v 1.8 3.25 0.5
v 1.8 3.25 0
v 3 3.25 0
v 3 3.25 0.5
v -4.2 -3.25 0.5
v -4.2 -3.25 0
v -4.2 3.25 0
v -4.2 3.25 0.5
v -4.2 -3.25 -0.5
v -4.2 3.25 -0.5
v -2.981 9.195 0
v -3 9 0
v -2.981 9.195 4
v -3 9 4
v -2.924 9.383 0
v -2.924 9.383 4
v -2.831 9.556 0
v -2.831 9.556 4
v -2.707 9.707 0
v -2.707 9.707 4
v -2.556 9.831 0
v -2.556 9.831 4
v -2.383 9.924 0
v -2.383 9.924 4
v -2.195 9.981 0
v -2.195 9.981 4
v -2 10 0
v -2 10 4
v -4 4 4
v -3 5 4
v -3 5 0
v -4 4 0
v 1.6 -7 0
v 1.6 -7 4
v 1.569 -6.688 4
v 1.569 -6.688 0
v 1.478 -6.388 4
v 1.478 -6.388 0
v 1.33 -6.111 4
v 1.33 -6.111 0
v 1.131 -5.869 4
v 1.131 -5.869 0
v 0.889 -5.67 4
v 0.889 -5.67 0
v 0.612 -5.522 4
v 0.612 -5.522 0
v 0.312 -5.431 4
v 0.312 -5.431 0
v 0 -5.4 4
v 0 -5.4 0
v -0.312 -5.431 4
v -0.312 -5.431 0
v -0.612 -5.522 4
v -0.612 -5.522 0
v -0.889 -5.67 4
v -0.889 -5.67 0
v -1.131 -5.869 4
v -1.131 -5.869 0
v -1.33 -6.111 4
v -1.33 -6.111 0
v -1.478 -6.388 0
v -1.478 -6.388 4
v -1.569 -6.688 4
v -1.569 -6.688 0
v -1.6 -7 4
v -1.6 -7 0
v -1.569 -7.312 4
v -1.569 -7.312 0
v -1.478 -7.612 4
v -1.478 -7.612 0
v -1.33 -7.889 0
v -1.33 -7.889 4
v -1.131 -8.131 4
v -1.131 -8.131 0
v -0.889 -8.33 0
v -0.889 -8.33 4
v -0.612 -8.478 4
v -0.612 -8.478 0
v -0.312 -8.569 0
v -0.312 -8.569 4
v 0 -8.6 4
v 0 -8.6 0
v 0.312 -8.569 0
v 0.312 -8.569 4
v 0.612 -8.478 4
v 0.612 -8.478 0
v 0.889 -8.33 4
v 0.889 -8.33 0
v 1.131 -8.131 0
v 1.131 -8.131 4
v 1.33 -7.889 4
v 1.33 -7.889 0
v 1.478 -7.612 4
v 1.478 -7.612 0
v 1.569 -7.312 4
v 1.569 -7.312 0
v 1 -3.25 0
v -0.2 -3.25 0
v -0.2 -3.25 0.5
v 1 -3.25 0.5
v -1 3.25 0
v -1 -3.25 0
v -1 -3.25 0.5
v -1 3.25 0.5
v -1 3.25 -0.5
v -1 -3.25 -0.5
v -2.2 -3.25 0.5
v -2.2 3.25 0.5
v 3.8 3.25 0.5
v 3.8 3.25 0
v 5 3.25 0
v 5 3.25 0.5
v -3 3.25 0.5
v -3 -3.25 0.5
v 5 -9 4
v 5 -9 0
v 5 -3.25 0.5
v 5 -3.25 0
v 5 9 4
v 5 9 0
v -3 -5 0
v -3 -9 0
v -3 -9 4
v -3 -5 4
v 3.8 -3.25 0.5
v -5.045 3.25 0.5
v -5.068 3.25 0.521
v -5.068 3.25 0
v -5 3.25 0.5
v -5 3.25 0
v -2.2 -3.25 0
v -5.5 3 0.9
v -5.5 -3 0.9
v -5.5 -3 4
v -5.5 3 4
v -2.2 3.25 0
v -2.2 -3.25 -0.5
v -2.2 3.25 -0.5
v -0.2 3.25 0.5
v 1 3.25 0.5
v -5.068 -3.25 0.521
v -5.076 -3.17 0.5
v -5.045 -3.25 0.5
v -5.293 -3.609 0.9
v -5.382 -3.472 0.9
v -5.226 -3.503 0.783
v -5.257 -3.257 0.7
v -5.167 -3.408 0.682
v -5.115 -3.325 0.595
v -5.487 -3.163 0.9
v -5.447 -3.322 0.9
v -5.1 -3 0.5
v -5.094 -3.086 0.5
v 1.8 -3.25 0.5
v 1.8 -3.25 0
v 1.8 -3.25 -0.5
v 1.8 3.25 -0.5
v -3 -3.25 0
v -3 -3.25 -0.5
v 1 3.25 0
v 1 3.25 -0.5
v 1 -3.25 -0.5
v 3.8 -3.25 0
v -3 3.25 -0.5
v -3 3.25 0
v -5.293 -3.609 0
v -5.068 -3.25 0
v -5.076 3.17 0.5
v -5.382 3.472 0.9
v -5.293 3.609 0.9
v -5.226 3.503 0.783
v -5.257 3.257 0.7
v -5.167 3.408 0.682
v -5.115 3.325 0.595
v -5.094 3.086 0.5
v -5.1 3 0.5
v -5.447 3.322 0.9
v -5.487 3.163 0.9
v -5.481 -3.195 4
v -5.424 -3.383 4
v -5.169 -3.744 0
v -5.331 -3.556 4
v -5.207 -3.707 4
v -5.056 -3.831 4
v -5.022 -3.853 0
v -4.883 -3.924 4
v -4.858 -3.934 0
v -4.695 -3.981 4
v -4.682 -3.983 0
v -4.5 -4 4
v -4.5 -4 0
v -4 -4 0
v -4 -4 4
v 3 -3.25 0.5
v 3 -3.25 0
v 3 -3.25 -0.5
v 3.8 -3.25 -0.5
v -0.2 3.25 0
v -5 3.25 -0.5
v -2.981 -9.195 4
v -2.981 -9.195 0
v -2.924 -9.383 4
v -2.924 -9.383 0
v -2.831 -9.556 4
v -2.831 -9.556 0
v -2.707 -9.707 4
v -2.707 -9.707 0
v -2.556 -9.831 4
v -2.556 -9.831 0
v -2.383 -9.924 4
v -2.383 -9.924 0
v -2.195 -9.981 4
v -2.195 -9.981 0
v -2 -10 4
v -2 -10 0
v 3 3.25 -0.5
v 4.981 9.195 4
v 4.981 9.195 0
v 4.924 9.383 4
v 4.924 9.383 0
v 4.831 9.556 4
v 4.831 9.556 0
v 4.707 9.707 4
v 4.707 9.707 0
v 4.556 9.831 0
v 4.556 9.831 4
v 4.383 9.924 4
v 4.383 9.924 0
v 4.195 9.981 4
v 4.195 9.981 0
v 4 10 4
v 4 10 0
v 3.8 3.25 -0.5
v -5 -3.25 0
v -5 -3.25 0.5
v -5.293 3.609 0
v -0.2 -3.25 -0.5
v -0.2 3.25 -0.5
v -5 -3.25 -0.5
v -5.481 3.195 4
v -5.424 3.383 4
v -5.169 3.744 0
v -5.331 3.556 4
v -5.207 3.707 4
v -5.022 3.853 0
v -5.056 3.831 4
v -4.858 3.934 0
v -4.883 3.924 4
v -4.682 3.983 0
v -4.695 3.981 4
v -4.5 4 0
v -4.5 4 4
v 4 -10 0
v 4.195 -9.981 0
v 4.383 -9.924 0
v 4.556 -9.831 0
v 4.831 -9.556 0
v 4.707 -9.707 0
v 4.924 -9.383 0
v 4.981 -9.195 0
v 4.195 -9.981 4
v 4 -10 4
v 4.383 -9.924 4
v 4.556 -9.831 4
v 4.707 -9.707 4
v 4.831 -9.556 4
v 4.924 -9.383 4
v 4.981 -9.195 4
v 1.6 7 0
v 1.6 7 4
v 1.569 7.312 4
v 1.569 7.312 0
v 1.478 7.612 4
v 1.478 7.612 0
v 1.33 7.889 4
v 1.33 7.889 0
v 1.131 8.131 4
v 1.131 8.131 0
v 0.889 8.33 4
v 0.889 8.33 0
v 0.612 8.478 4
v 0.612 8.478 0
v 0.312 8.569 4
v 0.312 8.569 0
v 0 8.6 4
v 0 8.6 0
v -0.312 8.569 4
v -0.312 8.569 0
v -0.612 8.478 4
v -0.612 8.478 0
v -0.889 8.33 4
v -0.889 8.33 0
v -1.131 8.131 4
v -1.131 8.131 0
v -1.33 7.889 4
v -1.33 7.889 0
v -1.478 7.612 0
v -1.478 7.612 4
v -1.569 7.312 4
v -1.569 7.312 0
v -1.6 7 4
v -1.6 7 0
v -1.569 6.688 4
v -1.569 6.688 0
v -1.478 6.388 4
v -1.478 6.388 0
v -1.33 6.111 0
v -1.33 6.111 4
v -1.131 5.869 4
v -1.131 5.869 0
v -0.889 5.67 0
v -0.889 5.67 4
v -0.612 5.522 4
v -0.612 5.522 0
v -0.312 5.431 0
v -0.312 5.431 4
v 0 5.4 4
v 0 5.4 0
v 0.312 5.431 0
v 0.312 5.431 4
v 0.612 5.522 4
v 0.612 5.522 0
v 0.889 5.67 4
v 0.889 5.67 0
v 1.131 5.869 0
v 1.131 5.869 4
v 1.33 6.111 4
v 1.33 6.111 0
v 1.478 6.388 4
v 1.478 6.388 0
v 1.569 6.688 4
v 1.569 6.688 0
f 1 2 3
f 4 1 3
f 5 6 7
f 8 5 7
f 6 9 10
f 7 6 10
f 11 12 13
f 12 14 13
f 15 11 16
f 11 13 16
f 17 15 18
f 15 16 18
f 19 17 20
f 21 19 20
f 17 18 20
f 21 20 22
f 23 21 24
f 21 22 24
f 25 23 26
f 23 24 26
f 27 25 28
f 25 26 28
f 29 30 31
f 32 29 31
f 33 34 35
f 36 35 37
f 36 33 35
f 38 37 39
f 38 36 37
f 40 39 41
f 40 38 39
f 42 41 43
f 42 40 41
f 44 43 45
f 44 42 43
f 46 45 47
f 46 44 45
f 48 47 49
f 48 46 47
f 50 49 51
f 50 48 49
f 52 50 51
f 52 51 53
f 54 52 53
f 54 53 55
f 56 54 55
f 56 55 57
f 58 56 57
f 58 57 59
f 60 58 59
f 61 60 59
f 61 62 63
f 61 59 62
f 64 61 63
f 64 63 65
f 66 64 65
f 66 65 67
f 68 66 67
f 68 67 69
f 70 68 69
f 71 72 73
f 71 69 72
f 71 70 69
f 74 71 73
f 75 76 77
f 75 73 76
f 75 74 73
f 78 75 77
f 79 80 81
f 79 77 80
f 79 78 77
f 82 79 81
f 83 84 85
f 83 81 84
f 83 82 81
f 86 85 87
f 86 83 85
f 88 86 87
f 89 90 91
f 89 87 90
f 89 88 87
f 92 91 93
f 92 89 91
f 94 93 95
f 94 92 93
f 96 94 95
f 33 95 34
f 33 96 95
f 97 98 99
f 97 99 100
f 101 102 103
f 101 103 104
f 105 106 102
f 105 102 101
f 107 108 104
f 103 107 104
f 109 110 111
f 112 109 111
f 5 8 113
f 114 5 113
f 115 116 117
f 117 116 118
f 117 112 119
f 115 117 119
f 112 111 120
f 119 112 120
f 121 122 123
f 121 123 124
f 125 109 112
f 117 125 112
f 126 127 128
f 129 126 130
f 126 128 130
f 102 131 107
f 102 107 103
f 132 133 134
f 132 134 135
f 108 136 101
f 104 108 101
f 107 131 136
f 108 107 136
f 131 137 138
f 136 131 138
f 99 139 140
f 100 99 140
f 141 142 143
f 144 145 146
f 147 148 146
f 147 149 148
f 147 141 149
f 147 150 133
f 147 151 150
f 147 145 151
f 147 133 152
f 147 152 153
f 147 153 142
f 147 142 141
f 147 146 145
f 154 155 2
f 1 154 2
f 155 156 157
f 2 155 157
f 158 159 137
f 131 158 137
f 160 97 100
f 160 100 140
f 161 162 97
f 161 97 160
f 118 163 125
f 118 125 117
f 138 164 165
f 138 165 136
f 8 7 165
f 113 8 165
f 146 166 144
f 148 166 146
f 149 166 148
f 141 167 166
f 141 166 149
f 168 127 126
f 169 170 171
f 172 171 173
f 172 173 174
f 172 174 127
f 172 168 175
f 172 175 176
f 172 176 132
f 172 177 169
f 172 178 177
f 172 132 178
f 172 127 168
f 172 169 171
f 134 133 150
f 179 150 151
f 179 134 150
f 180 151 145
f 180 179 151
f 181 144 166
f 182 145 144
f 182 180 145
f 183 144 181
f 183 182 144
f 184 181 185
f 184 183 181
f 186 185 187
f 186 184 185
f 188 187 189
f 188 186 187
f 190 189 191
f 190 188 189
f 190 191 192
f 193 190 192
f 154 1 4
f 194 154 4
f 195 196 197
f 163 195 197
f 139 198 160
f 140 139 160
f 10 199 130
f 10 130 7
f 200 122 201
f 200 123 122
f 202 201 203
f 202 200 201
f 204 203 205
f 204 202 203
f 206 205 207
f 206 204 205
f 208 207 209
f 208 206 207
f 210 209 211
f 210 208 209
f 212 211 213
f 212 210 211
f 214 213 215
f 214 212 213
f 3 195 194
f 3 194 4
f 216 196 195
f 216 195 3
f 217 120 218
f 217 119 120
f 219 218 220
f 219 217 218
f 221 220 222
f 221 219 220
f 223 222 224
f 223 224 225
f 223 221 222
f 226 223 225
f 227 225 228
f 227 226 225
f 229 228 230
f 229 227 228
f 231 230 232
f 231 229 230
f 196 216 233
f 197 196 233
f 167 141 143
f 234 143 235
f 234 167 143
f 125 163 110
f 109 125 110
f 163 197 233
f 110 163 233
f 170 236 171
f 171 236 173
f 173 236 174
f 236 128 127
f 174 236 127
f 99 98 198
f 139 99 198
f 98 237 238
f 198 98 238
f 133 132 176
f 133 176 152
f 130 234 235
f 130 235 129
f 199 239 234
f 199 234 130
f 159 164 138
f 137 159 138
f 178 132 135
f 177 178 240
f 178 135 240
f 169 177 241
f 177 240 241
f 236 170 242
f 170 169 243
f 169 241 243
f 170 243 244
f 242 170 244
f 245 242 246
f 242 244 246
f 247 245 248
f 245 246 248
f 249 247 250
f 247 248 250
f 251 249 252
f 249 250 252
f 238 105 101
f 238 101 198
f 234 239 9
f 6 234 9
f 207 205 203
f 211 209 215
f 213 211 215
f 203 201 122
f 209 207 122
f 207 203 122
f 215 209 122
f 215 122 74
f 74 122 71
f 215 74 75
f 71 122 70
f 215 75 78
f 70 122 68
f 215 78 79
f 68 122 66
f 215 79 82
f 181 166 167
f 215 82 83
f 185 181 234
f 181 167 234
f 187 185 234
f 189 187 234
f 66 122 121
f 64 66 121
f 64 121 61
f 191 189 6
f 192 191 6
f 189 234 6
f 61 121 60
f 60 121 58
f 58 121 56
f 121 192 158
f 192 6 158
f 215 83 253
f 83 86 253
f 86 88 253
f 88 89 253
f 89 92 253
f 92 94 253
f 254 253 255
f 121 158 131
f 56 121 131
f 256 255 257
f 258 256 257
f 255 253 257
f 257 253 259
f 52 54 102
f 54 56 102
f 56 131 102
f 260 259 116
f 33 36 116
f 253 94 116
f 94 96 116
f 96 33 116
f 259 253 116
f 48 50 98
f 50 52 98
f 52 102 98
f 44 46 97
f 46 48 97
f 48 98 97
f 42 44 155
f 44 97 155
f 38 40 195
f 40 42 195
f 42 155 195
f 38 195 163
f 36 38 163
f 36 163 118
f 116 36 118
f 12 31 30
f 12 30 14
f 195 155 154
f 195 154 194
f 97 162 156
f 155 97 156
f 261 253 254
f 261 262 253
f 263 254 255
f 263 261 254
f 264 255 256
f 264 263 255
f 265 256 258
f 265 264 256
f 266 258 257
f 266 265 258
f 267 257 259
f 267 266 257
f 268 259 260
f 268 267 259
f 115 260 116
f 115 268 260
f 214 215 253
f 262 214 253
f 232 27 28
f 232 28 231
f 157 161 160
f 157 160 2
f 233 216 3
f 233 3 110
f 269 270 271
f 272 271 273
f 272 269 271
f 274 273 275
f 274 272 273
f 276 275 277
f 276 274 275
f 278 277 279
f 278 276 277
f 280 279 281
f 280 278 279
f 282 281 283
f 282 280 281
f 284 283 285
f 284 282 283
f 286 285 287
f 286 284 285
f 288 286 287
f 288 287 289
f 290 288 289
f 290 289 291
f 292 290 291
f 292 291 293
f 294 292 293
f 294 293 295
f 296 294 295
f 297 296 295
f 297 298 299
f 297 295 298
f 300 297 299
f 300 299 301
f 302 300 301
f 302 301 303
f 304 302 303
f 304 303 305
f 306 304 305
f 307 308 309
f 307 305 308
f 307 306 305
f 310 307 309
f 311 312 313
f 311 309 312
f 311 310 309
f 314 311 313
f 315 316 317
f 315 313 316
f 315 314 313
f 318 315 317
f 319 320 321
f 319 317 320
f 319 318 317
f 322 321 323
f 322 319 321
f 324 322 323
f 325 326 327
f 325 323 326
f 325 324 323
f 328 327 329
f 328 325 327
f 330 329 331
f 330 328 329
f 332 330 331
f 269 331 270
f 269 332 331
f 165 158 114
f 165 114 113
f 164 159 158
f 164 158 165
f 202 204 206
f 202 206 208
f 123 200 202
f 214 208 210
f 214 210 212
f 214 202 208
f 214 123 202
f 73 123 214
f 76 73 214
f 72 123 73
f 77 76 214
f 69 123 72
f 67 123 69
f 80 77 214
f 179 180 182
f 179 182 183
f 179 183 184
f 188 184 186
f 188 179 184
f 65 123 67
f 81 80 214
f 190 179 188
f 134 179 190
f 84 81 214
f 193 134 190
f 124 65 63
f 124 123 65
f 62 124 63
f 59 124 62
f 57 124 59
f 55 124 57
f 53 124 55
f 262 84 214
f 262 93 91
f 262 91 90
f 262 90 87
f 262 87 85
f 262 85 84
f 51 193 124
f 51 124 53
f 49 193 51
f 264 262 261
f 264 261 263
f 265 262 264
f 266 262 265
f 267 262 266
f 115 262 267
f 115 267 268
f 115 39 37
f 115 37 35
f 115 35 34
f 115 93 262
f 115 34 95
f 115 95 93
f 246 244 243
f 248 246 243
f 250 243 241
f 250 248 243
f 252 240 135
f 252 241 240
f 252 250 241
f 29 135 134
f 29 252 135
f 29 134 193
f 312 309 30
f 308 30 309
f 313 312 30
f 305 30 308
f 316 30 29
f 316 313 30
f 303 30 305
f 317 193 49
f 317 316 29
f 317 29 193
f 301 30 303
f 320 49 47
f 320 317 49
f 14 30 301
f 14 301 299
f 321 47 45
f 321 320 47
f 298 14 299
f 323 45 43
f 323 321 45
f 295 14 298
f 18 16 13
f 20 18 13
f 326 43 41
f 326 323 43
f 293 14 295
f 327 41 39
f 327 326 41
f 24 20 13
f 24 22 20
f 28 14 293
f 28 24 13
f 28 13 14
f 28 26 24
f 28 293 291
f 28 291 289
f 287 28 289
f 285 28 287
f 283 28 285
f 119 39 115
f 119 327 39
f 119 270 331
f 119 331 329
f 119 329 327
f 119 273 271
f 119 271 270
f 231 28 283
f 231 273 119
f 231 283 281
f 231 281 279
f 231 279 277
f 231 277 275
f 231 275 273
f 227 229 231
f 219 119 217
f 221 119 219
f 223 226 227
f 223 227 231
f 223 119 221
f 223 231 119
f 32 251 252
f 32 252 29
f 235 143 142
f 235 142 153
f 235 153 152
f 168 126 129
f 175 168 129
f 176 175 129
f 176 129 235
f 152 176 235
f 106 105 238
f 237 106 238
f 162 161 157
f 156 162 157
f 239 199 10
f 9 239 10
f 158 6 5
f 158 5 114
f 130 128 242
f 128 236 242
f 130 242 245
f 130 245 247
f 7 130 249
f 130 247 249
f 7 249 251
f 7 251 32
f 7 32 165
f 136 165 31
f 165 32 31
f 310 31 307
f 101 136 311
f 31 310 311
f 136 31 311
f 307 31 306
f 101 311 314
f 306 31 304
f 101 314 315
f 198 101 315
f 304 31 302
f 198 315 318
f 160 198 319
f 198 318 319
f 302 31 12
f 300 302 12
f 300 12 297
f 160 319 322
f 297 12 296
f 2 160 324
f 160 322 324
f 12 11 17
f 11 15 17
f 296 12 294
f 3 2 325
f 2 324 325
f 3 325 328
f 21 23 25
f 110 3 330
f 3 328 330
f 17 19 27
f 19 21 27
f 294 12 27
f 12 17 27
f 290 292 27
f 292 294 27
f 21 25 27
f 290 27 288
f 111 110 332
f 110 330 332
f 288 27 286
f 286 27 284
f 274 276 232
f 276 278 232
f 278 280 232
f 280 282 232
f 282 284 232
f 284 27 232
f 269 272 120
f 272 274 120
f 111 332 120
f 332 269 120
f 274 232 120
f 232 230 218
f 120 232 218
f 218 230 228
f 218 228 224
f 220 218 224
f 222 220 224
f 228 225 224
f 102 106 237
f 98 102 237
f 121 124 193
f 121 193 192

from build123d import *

# Parameters (mm, degrees)
BOX048_W           = 1.2
BOX048_H           = 6.5
BOX048_DEPTH       = 0.5
BOX049_W           = 1.2
BOX049_H           = 6.5
BOX049_DEPTH       = 0.5
BOX044_W           = 1.2
BOX044_H           = 6.5
BOX044_DEPTH       = 0.5
BOX043_W           = 1.2
BOX043_H           = 6.5
BOX043_DEPTH       = 0.5
BOX039_W           = 1.2
BOX039_H           = 6.5
BOX039_DEPTH       = 0.5
BOX045_W           = 1.2
BOX045_H           = 6.5
BOX045_DEPTH       = 0.5
BOX041_W           = 0.8
BOX041_H           = 6.5
BOX041_DEPTH       = 0.5
BOX040_W           = 0.8
BOX040_H           = 6.5
BOX040_DEPTH       = 0.5
BOX038_W           = 0.8
BOX038_H           = 6.5
BOX038_DEPTH       = 0.5
BOX042_W           = 0.8
BOX042_H           = 6.5
BOX042_DEPTH       = 0.5
BOX047_W           = 0.8
BOX047_H           = 6.5
BOX047_DEPTH       = 0.5
BOX046_W           = 3
BOX046_H           = 8
BOX046_DEPTH       = 4
CYLINDER012_R      = 1.6
CYLINDER012_DEPTH  = 10
CYLINDER011_R      = 1.6
CYLINDER011_DEPTH  = 10
BOX008_W           = 8
BOX008_H           = 20
BOX008_DEPTH       = 4
FILLET002_R        = 1
FILLET_R           = 1
CHAMFER008010_SIZE = 1
CHAMFER008011_SIZE = 0.4


with BuildPart() as cube044:
    # Box048 → Box048 (new body)
    with BuildSketch(Plane(origin=(-4.2, -3.25, 0), x_dir=(1, 0, 0), z_dir=(0, 0, 1))):
        with Locations((0.6, 3.25)):
            Rectangle(BOX048_W, BOX048_H)
    extrude(amount=BOX048_DEPTH)


with BuildPart() as cube045:
    # Box049 → Box049 (new body)
    with BuildSketch(Plane(origin=(-6.2, -3.25, 0), x_dir=(1, 0, 0), z_dir=(0, 0, 1))):
        with Locations((0.6, 3.25)):
            Rectangle(BOX049_W, BOX049_H)
    extrude(amount=BOX049_DEPTH)


with BuildPart() as cube040:
    # Box044 → Box044 (new body)
    with BuildSketch(Plane(origin=(1, -3.25, 0), x_dir=(1, 0, 0), z_dir=(0, 0, 1))):
        with Locations((0.6, 3.25)):
            Rectangle(BOX044_W, BOX044_H)
    extrude(amount=BOX044_DEPTH)


with BuildPart() as cube039:
    # Box043 → Box043 (new body)
    with BuildSketch(Plane(origin=(-1, -3.25, 0), x_dir=(1, 0, 0), z_dir=(0, 0, 1))):
        with Locations((0.6, 3.25)):
            Rectangle(BOX043_W, BOX043_H)
    extrude(amount=BOX043_DEPTH)


with BuildPart() as cube035:
    # Box039 → Box039 (new body)
    with BuildSketch(Plane(origin=(-3, -3.25, 0), x_dir=(1, 0, 0), z_dir=(0, 0, 1))):
        with Locations((0.6, 3.25)):
            Rectangle(BOX039_W, BOX039_H)
    extrude(amount=BOX039_DEPTH)


with BuildPart() as fusion001007011052:
    # Box045 → Box045 (new body)
    with BuildSketch(Plane(origin=(3, -3.25, 0), x_dir=(1, 0, 0), z_dir=(0, 0, 1))):
        with Locations((0.6, 3.25)):
            Rectangle(BOX045_W, BOX045_H)
    extrude(amount=BOX045_DEPTH)

    # Fusion001007011047: union Cube040, Cube039, Cube035
    add(cube040.part)
    add(cube039.part)
    add(cube035.part)


with BuildPart() as fusion001007011052_1:
    # Fusion001007011047 placement: moved
    add(fusion001007011052.part.moved(Location((0.8, 0, 0))))

    # Fusion001007011052: union Cube044, Cube045
    add(cube044.part)
    add(cube045.part)


with BuildPart() as cube037:
    # Box041 → Box041 (new body)
    with BuildSketch(Plane(origin=(2.2, -3.25, -0.5), x_dir=(1, 0, 0), z_dir=(0, 0, 1))):
        with Locations((0.4, 3.25)):
            Rectangle(BOX041_W, BOX041_H)
    extrude(amount=BOX041_DEPTH)


with BuildPart() as cube036:
    # Box040 → Box040 (new body)
    with BuildSketch(Plane(origin=(0.2, -3.25, -0.5), x_dir=(1, 0, 0), z_dir=(0, 0, 1))):
        with Locations((0.4, 3.25)):
            Rectangle(BOX040_W, BOX040_H)
    extrude(amount=BOX040_DEPTH)


with BuildPart() as cube034:
    # Box038 → Box038 (new body)
    with BuildSketch(Plane(origin=(-1.8, -3.25, -0.5), x_dir=(1, 0, 0), z_dir=(0, 0, 1))):
        with Locations((0.4, 3.25)):
            Rectangle(BOX038_W, BOX038_H)
    extrude(amount=BOX038_DEPTH)


with BuildPart() as fusion001007011046:
    # Box042 → Box042 (new body)
    with BuildSketch(Plane(origin=(4.2, -3.25, -0.5), x_dir=(1, 0, 0), z_dir=(0, 0, 1))):
        with Locations((0.4, 3.25)):
            Rectangle(BOX042_W, BOX042_H)
    extrude(amount=BOX042_DEPTH)

    # Fusion001007011046: union Cube037, Cube036, Cube034
    add(cube037.part)
    add(cube036.part)
    add(cube034.part)


with BuildPart() as fusion001007011046_1:
    # Fusion001007011046 placement: moved
    add(fusion001007011046.part.moved(Location((-1.2, 0, 0))))


with BuildPart() as fusion001007011049:
    # Box047 → Box047 (new body)
    with BuildSketch(Plane(origin=(-5, -3.25, -0.5), x_dir=(1, 0, 0), z_dir=(0, 0, 1))):
        with Locations((0.4, 3.25)):
            Rectangle(BOX047_W, BOX047_H)
    extrude(amount=BOX047_DEPTH)

    # Fusion001007011049: union Fusion001007011046
    add(fusion001007011046_1.part)


with BuildPart() as cube042:
    # Box046 → Box046 (new body)
    with BuildSketch(Plane(origin=(-5.5, -4, 0), x_dir=(1, 0, 0), z_dir=(0, 0, 1))):
        with Locations((1.5, 4)):
            Rectangle(BOX046_W, BOX046_H)
    extrude(amount=BOX046_DEPTH)


with BuildPart() as cylinder012:
    # Cylinder012 → Cylinder012 (new body)
    with BuildSketch(Plane(origin=(0, -7, 0), x_dir=(1, 0, 0), z_dir=(0, 0, 1))):
        Circle(CYLINDER012_R)
    extrude(amount=CYLINDER012_DEPTH)


with BuildPart() as fusion017:
    # Cylinder011 → Cylinder011 (new body)
    with BuildSketch(Plane(origin=(0, 7, 0), x_dir=(1, 0, 0), z_dir=(0, 0, 1))):
        Circle(CYLINDER011_R)
    extrude(amount=CYLINDER011_DEPTH)

    # Fusion017: union Cylinder012
    add(cylinder012.part)


with BuildPart() as belt_clamp:
    # Box008 → Box008 (new body)
    with BuildSketch(Plane(origin=(-3, -10, 0), x_dir=(1, 0, 0), z_dir=(0, 0, 1))):
        with Locations((4, 10)):
            Rectangle(BOX008_W, BOX008_H)
    extrude(amount=BOX008_DEPTH)

    # Fillet002
    fillet002_edges = [belt_clamp.edges().sort_by_distance(p)[0] for p in [
        (-3, -10, 2),
        (-3, 10, 2),
        (5, -10, 2),
        (5, 10, 2),
    ]]
    fillet(fillet002_edges, radius=FILLET002_R)

    # Cut008004003012001003001009: cut Fusion017
    add(fusion017.part, mode=Mode.SUBTRACT)

    # Fusion001007011048: union Cube042
    add(cube042.part)

    # Fillet
    fillet_edges = [belt_clamp.edges().sort_by_distance(p)[0] for p in [
        (-5.5, -4, 2),
        (-5.5, 4, 2),
    ]]
    fillet(fillet_edges, radius=FILLET_R)

    # Chamfer008010
    chamfer008010_edges = [belt_clamp.edges().sort_by_distance(p)[0] for p in [
        (-3, 4, 2),
        (-3, -4, 2),
    ]]
    chamfer(chamfer008010_edges, length=CHAMFER008010_SIZE)

    # Fusion001007011051: union Fusion001007011049
    add(fusion001007011049.part)

    # Cut008004003012001003001010001023: cut Fusion001007011052
    add(fusion001007011052_1.part, mode=Mode.SUBTRACT)

    # Chamfer008011
    chamfer008011_edges = [belt_clamp.edges().sort_by_distance(p)[0] for p in [
        (-5.468246, 3.25, 0.25),
        (-5.49203, 3.126004, 0.5),
        (-5.5, 0, 0.5),
        (-5.468246, -3.25, 0.25),
        (-5.49203, -3.126004, 0.5),
    ]]
    chamfer(chamfer008011_edges, length=CHAMFER008011_SIZE)


solid = belt_clamp.part
